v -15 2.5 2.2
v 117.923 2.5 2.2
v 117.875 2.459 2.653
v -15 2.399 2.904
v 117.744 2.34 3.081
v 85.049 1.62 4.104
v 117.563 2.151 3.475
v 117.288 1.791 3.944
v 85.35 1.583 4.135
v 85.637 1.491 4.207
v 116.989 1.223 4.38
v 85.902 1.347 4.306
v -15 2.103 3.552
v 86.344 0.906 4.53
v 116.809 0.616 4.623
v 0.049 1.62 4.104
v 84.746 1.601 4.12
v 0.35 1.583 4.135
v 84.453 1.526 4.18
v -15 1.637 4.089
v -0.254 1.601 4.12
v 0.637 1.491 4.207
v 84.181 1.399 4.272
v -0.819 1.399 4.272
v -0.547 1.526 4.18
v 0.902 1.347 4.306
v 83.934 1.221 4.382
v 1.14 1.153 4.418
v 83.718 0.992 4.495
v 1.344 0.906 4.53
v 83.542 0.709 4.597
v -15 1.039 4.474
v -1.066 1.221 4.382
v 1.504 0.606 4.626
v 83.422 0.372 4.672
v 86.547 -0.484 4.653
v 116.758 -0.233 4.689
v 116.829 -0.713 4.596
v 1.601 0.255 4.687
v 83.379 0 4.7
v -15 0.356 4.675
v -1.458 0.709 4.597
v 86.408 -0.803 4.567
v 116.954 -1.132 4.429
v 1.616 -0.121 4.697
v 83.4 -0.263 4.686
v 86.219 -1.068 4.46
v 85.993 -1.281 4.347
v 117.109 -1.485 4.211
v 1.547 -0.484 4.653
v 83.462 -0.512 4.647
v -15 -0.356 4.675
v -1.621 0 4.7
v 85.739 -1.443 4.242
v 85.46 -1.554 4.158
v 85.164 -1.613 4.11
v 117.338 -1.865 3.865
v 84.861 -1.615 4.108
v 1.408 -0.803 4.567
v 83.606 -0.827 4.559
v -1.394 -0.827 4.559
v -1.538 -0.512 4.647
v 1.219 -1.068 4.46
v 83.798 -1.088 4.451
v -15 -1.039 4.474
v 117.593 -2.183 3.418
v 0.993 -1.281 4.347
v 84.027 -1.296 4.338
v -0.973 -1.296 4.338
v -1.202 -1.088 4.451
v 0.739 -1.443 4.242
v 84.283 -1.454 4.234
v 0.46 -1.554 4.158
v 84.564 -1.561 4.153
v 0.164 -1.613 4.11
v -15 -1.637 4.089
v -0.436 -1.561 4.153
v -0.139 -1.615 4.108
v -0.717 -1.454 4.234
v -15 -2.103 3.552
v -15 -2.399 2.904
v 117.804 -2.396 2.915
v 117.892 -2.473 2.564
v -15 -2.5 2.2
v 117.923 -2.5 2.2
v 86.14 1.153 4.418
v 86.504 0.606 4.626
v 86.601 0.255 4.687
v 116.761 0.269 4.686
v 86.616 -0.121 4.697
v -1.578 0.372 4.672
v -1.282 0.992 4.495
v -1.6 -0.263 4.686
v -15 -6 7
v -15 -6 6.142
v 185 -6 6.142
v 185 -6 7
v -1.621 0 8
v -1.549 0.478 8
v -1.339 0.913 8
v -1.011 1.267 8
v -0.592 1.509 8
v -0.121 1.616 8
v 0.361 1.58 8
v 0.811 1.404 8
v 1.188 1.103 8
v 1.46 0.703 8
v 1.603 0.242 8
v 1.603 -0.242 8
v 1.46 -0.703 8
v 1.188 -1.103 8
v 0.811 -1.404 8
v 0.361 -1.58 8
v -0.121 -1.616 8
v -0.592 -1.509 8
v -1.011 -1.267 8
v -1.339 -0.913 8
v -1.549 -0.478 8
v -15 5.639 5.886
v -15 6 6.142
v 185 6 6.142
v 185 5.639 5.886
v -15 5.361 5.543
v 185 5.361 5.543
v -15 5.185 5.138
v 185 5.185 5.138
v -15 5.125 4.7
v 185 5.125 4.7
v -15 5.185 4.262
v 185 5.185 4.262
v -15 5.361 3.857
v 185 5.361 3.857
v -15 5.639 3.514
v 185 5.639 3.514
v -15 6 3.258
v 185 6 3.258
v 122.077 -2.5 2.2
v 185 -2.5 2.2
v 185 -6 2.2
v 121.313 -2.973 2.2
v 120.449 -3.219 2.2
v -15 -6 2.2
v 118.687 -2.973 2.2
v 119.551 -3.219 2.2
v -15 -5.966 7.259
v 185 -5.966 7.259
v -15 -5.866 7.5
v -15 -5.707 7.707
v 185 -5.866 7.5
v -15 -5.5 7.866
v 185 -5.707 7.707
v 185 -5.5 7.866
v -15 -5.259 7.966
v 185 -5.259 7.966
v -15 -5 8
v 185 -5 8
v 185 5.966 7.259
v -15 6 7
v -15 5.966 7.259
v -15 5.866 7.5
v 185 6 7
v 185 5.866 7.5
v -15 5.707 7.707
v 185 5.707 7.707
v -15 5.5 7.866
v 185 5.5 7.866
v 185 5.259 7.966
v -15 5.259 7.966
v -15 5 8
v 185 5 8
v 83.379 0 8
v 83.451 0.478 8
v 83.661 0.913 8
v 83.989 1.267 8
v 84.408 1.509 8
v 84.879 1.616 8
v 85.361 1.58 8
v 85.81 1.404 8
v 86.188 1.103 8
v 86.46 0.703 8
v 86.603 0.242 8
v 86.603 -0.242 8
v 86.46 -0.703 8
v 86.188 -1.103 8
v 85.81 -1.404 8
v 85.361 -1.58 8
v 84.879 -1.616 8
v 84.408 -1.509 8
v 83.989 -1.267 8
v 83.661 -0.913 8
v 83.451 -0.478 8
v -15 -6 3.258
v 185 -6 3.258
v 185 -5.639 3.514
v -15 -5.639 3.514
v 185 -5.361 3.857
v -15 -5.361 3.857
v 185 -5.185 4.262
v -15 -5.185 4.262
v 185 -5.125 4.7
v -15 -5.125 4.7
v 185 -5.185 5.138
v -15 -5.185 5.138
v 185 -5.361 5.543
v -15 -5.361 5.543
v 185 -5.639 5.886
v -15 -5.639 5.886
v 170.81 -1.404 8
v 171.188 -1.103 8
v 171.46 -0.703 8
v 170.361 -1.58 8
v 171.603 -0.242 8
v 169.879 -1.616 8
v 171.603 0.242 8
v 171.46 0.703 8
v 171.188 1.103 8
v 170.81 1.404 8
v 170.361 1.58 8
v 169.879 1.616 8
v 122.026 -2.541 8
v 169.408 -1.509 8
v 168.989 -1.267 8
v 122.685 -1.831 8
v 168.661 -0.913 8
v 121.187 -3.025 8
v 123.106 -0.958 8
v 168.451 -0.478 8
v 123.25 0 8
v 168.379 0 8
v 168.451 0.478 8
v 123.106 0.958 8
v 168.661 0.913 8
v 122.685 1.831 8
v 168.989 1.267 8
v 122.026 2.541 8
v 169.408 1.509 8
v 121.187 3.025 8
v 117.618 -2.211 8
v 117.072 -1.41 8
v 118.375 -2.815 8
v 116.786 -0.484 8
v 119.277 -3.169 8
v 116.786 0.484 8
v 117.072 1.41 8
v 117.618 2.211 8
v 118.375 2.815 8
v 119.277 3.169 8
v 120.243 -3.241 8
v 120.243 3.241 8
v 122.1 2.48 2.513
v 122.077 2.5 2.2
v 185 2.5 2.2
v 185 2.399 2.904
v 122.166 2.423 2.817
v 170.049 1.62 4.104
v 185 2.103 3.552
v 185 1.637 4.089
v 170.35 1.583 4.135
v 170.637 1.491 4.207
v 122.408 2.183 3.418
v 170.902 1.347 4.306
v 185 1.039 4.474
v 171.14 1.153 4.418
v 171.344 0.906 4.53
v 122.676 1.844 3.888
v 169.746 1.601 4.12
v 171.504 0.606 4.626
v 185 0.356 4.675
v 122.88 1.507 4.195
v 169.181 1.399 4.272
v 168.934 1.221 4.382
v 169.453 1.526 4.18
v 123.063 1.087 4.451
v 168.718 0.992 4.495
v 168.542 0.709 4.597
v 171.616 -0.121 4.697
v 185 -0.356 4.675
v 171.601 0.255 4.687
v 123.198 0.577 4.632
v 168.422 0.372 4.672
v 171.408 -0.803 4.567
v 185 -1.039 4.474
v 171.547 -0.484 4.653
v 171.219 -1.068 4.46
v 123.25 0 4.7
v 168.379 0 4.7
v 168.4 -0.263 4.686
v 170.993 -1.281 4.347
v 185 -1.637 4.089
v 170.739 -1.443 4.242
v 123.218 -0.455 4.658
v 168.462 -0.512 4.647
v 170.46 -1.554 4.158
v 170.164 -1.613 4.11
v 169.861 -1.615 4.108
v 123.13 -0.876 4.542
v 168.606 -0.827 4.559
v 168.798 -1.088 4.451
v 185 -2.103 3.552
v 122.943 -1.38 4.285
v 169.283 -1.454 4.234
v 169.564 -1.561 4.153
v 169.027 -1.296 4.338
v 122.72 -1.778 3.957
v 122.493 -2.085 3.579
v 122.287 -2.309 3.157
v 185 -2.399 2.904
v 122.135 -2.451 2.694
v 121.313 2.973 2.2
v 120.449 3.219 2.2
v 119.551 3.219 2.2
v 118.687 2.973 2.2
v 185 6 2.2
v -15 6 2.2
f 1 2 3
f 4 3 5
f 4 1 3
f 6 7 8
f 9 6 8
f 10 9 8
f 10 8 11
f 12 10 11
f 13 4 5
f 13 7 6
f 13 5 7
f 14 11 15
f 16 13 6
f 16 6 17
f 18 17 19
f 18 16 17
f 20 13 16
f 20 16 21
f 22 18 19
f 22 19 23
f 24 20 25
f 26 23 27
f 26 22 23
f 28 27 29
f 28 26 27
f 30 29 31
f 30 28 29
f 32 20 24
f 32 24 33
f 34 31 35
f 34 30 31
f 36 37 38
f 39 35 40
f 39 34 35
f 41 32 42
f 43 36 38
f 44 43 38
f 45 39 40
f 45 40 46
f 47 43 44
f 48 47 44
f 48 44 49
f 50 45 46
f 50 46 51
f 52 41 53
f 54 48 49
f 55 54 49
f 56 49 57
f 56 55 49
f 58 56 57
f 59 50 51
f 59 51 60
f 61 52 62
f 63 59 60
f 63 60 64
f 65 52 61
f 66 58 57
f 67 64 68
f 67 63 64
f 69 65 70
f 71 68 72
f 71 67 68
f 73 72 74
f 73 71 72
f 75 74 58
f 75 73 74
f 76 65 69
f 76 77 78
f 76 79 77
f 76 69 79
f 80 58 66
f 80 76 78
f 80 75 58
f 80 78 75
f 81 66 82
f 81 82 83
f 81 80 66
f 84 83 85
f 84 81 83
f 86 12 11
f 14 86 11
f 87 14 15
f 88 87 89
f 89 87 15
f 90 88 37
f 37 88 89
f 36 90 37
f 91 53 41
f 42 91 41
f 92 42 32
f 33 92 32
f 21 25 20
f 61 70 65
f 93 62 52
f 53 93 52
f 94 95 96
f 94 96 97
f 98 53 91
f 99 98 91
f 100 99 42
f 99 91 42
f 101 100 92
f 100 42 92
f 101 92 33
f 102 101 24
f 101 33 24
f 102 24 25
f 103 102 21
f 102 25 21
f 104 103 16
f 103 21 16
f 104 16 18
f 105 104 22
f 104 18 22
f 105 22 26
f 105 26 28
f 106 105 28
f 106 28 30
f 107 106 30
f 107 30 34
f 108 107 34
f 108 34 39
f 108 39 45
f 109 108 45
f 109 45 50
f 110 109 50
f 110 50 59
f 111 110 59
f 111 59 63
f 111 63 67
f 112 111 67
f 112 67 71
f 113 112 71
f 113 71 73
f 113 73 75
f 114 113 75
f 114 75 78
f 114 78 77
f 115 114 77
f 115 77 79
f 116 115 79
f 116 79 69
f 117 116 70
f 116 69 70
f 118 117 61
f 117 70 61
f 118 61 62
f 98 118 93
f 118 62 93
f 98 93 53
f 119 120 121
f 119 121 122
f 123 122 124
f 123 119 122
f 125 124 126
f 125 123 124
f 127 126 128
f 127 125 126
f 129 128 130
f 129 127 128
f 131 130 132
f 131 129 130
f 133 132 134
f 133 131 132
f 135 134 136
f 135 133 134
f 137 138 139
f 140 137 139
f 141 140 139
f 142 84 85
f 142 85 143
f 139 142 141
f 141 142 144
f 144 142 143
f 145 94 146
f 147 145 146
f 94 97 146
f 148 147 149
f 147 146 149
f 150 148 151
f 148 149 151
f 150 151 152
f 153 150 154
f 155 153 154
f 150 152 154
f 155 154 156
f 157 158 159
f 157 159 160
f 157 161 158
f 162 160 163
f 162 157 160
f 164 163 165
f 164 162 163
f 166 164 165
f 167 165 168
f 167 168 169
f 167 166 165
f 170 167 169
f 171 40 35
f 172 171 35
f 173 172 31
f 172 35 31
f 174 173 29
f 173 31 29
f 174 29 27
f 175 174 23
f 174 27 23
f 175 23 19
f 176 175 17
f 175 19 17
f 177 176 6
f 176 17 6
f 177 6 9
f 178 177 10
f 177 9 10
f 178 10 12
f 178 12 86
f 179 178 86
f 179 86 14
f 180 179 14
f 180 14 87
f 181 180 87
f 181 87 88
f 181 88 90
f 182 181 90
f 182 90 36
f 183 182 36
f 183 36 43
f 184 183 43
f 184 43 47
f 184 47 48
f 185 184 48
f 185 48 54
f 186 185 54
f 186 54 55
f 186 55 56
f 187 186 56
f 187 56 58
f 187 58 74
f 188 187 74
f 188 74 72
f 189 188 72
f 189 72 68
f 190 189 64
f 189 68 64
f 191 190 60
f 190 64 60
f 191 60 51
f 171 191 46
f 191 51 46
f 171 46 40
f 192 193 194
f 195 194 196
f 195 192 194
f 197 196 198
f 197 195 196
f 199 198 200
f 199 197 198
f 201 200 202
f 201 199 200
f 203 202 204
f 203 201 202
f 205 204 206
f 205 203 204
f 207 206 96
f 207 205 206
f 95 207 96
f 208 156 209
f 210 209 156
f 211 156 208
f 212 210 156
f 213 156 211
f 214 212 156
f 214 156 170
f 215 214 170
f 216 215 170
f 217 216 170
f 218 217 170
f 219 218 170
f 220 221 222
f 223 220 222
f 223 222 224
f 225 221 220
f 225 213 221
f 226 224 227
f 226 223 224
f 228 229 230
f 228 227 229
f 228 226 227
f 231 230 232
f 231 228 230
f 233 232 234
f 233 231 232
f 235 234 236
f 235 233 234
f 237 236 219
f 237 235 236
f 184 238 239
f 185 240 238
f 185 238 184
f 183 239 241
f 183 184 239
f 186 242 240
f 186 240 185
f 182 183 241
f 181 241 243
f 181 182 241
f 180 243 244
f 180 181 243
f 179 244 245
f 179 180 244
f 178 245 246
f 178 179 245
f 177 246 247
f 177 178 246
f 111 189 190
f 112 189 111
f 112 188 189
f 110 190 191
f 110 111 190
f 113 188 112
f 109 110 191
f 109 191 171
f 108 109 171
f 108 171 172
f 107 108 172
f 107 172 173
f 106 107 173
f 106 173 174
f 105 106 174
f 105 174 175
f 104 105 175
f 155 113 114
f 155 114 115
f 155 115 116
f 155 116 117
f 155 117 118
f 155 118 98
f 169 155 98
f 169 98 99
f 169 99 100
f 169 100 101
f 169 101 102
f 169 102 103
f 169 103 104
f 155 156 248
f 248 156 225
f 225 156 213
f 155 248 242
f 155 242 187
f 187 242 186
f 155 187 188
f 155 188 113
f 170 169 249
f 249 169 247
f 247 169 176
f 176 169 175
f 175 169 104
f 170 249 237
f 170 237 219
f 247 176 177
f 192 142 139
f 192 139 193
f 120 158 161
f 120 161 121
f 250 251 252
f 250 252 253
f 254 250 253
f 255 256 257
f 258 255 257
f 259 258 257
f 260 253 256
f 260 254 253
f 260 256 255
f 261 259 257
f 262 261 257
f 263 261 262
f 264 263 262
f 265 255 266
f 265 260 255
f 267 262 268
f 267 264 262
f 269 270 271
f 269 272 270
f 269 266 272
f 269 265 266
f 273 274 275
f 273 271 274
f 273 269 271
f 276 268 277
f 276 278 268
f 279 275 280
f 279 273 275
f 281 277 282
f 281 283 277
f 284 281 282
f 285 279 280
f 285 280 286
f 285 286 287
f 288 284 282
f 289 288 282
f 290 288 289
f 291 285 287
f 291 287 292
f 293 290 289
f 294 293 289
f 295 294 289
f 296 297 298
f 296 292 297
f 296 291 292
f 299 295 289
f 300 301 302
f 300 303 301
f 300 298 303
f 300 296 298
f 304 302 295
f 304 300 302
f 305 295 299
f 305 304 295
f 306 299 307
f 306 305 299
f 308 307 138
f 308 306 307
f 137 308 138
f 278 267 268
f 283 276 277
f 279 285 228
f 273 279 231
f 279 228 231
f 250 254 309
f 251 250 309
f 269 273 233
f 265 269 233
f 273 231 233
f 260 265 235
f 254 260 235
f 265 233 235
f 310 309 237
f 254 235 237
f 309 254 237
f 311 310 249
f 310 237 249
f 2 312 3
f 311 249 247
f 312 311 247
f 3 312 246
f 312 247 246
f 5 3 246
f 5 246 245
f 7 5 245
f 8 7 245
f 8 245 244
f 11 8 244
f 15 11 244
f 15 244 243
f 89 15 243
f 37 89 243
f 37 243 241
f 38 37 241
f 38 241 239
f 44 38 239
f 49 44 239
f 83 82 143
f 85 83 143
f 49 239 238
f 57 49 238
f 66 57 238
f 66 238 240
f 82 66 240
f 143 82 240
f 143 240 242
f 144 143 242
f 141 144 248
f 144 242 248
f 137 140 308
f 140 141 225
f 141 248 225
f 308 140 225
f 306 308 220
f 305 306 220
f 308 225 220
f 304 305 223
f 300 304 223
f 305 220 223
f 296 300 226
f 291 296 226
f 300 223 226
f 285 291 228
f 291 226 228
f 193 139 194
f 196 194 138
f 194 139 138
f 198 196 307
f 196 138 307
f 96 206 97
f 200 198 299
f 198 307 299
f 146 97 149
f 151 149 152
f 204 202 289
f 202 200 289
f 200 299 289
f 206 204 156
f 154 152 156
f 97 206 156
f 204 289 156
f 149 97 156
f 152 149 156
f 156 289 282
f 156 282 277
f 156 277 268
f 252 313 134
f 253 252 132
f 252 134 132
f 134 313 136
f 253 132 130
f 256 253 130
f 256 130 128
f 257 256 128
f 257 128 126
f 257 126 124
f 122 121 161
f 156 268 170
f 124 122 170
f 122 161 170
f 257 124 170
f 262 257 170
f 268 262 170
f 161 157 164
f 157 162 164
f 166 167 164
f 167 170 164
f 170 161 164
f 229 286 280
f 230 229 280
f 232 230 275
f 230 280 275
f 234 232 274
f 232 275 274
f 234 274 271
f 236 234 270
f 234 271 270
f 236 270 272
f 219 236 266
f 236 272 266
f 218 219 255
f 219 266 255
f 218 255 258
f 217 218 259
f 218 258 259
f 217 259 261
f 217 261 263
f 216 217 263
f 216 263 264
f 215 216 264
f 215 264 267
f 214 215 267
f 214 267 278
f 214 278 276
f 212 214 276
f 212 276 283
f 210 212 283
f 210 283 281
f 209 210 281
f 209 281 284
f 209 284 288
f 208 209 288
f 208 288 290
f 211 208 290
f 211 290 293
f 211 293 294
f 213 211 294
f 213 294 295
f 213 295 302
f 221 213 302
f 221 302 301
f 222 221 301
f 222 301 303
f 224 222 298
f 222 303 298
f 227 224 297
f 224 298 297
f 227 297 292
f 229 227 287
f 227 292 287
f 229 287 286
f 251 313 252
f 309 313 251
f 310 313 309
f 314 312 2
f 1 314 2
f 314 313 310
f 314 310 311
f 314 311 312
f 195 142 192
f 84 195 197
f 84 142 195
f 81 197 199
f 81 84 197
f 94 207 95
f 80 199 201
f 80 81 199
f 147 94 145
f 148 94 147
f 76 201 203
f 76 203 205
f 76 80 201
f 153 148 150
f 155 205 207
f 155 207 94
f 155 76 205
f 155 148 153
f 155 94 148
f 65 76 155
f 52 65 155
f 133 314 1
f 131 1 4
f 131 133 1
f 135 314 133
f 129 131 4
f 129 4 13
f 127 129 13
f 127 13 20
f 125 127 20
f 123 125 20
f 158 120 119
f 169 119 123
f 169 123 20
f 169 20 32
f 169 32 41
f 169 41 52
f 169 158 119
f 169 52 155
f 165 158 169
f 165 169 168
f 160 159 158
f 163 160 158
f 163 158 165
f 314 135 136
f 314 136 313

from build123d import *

# Parameters (mm, degrees)
BOSS_EXTRUDE1_DEPTH = 200
FILLET1_R           = 1
SKETCH2_R           = 1.625
CUT_EXTRUDE1_DEPTH  = 201.249843945
TAP1_D              = 3.242
TAP2_D              = 3.242
SKETCH7_R           = 3.25
CUT_EXTRUDE2_DEPTH  = 186.188120672


with BuildPart() as part:
    # Sketch1 → Boss-Extrude1 (new body)
    with BuildSketch(Plane(origin=(-15, 0, 0), x_dir=(0, 0, -1), z_dir=(1, 0, 0))):
        with BuildLine():
            Line((-8, 6), (-2.2, 6))
            Line((-2.2, 6), (-2.2, 2.5))
            ThreePointArc((-2.2, 2.5), (-4.7, 0), (-2.2, -2.5))
            Line((-2.2, -2.5), (-2.2, -6))
            Line((-2.2, -6), (-8, -6))
            Line((-8, -6), (-8, 6))
        make_face()
    extrude(amount=BOSS_EXTRUDE1_DEPTH)

    # Fillet1
    fillet1_edges = [part.edges().sort_by_distance(p)[0] for p in [
        (85, 6, 8),
        (85, -6, 8),
    ]]
    fillet(fillet1_edges, radius=FILLET1_R)

    # Sketch2 → Cut-Extrude1 (cut, through all)
    with BuildSketch(Plane(origin=(-15, 0, 0), x_dir=(0, 0, -1), z_dir=(1, 0, 0))):
        with Locations((-4.7, 6.75)):
            Circle(SKETCH2_R)
        with Locations((-4.7, -6.75)):
            Circle(SKETCH2_R)
    extrude(amount=CUT_EXTRUDE1_DEPTH, mode=Mode.SUBTRACT)

    # Tap1 (through all)
    with Locations(Plane.XY.offset(8)):
        with Locations((0, 0), (170, 0)):
            Hole(TAP1_D / 2)

    # Tap2 (through all)
    with Locations(Plane.XY.offset(8)):
        with Locations((85, 0)):
            Hole(TAP2_D / 2)

    # Sketch7 → Cut-Extrude2 (cut, through all)
    with BuildSketch(Plane.XY.offset(8)):
        with Locations((120, 0)):
            Circle(SKETCH7_R)
    extrude(amount=-CUT_EXTRUDE2_DEPTH, mode=Mode.SUBTRACT)


solid = part.part
